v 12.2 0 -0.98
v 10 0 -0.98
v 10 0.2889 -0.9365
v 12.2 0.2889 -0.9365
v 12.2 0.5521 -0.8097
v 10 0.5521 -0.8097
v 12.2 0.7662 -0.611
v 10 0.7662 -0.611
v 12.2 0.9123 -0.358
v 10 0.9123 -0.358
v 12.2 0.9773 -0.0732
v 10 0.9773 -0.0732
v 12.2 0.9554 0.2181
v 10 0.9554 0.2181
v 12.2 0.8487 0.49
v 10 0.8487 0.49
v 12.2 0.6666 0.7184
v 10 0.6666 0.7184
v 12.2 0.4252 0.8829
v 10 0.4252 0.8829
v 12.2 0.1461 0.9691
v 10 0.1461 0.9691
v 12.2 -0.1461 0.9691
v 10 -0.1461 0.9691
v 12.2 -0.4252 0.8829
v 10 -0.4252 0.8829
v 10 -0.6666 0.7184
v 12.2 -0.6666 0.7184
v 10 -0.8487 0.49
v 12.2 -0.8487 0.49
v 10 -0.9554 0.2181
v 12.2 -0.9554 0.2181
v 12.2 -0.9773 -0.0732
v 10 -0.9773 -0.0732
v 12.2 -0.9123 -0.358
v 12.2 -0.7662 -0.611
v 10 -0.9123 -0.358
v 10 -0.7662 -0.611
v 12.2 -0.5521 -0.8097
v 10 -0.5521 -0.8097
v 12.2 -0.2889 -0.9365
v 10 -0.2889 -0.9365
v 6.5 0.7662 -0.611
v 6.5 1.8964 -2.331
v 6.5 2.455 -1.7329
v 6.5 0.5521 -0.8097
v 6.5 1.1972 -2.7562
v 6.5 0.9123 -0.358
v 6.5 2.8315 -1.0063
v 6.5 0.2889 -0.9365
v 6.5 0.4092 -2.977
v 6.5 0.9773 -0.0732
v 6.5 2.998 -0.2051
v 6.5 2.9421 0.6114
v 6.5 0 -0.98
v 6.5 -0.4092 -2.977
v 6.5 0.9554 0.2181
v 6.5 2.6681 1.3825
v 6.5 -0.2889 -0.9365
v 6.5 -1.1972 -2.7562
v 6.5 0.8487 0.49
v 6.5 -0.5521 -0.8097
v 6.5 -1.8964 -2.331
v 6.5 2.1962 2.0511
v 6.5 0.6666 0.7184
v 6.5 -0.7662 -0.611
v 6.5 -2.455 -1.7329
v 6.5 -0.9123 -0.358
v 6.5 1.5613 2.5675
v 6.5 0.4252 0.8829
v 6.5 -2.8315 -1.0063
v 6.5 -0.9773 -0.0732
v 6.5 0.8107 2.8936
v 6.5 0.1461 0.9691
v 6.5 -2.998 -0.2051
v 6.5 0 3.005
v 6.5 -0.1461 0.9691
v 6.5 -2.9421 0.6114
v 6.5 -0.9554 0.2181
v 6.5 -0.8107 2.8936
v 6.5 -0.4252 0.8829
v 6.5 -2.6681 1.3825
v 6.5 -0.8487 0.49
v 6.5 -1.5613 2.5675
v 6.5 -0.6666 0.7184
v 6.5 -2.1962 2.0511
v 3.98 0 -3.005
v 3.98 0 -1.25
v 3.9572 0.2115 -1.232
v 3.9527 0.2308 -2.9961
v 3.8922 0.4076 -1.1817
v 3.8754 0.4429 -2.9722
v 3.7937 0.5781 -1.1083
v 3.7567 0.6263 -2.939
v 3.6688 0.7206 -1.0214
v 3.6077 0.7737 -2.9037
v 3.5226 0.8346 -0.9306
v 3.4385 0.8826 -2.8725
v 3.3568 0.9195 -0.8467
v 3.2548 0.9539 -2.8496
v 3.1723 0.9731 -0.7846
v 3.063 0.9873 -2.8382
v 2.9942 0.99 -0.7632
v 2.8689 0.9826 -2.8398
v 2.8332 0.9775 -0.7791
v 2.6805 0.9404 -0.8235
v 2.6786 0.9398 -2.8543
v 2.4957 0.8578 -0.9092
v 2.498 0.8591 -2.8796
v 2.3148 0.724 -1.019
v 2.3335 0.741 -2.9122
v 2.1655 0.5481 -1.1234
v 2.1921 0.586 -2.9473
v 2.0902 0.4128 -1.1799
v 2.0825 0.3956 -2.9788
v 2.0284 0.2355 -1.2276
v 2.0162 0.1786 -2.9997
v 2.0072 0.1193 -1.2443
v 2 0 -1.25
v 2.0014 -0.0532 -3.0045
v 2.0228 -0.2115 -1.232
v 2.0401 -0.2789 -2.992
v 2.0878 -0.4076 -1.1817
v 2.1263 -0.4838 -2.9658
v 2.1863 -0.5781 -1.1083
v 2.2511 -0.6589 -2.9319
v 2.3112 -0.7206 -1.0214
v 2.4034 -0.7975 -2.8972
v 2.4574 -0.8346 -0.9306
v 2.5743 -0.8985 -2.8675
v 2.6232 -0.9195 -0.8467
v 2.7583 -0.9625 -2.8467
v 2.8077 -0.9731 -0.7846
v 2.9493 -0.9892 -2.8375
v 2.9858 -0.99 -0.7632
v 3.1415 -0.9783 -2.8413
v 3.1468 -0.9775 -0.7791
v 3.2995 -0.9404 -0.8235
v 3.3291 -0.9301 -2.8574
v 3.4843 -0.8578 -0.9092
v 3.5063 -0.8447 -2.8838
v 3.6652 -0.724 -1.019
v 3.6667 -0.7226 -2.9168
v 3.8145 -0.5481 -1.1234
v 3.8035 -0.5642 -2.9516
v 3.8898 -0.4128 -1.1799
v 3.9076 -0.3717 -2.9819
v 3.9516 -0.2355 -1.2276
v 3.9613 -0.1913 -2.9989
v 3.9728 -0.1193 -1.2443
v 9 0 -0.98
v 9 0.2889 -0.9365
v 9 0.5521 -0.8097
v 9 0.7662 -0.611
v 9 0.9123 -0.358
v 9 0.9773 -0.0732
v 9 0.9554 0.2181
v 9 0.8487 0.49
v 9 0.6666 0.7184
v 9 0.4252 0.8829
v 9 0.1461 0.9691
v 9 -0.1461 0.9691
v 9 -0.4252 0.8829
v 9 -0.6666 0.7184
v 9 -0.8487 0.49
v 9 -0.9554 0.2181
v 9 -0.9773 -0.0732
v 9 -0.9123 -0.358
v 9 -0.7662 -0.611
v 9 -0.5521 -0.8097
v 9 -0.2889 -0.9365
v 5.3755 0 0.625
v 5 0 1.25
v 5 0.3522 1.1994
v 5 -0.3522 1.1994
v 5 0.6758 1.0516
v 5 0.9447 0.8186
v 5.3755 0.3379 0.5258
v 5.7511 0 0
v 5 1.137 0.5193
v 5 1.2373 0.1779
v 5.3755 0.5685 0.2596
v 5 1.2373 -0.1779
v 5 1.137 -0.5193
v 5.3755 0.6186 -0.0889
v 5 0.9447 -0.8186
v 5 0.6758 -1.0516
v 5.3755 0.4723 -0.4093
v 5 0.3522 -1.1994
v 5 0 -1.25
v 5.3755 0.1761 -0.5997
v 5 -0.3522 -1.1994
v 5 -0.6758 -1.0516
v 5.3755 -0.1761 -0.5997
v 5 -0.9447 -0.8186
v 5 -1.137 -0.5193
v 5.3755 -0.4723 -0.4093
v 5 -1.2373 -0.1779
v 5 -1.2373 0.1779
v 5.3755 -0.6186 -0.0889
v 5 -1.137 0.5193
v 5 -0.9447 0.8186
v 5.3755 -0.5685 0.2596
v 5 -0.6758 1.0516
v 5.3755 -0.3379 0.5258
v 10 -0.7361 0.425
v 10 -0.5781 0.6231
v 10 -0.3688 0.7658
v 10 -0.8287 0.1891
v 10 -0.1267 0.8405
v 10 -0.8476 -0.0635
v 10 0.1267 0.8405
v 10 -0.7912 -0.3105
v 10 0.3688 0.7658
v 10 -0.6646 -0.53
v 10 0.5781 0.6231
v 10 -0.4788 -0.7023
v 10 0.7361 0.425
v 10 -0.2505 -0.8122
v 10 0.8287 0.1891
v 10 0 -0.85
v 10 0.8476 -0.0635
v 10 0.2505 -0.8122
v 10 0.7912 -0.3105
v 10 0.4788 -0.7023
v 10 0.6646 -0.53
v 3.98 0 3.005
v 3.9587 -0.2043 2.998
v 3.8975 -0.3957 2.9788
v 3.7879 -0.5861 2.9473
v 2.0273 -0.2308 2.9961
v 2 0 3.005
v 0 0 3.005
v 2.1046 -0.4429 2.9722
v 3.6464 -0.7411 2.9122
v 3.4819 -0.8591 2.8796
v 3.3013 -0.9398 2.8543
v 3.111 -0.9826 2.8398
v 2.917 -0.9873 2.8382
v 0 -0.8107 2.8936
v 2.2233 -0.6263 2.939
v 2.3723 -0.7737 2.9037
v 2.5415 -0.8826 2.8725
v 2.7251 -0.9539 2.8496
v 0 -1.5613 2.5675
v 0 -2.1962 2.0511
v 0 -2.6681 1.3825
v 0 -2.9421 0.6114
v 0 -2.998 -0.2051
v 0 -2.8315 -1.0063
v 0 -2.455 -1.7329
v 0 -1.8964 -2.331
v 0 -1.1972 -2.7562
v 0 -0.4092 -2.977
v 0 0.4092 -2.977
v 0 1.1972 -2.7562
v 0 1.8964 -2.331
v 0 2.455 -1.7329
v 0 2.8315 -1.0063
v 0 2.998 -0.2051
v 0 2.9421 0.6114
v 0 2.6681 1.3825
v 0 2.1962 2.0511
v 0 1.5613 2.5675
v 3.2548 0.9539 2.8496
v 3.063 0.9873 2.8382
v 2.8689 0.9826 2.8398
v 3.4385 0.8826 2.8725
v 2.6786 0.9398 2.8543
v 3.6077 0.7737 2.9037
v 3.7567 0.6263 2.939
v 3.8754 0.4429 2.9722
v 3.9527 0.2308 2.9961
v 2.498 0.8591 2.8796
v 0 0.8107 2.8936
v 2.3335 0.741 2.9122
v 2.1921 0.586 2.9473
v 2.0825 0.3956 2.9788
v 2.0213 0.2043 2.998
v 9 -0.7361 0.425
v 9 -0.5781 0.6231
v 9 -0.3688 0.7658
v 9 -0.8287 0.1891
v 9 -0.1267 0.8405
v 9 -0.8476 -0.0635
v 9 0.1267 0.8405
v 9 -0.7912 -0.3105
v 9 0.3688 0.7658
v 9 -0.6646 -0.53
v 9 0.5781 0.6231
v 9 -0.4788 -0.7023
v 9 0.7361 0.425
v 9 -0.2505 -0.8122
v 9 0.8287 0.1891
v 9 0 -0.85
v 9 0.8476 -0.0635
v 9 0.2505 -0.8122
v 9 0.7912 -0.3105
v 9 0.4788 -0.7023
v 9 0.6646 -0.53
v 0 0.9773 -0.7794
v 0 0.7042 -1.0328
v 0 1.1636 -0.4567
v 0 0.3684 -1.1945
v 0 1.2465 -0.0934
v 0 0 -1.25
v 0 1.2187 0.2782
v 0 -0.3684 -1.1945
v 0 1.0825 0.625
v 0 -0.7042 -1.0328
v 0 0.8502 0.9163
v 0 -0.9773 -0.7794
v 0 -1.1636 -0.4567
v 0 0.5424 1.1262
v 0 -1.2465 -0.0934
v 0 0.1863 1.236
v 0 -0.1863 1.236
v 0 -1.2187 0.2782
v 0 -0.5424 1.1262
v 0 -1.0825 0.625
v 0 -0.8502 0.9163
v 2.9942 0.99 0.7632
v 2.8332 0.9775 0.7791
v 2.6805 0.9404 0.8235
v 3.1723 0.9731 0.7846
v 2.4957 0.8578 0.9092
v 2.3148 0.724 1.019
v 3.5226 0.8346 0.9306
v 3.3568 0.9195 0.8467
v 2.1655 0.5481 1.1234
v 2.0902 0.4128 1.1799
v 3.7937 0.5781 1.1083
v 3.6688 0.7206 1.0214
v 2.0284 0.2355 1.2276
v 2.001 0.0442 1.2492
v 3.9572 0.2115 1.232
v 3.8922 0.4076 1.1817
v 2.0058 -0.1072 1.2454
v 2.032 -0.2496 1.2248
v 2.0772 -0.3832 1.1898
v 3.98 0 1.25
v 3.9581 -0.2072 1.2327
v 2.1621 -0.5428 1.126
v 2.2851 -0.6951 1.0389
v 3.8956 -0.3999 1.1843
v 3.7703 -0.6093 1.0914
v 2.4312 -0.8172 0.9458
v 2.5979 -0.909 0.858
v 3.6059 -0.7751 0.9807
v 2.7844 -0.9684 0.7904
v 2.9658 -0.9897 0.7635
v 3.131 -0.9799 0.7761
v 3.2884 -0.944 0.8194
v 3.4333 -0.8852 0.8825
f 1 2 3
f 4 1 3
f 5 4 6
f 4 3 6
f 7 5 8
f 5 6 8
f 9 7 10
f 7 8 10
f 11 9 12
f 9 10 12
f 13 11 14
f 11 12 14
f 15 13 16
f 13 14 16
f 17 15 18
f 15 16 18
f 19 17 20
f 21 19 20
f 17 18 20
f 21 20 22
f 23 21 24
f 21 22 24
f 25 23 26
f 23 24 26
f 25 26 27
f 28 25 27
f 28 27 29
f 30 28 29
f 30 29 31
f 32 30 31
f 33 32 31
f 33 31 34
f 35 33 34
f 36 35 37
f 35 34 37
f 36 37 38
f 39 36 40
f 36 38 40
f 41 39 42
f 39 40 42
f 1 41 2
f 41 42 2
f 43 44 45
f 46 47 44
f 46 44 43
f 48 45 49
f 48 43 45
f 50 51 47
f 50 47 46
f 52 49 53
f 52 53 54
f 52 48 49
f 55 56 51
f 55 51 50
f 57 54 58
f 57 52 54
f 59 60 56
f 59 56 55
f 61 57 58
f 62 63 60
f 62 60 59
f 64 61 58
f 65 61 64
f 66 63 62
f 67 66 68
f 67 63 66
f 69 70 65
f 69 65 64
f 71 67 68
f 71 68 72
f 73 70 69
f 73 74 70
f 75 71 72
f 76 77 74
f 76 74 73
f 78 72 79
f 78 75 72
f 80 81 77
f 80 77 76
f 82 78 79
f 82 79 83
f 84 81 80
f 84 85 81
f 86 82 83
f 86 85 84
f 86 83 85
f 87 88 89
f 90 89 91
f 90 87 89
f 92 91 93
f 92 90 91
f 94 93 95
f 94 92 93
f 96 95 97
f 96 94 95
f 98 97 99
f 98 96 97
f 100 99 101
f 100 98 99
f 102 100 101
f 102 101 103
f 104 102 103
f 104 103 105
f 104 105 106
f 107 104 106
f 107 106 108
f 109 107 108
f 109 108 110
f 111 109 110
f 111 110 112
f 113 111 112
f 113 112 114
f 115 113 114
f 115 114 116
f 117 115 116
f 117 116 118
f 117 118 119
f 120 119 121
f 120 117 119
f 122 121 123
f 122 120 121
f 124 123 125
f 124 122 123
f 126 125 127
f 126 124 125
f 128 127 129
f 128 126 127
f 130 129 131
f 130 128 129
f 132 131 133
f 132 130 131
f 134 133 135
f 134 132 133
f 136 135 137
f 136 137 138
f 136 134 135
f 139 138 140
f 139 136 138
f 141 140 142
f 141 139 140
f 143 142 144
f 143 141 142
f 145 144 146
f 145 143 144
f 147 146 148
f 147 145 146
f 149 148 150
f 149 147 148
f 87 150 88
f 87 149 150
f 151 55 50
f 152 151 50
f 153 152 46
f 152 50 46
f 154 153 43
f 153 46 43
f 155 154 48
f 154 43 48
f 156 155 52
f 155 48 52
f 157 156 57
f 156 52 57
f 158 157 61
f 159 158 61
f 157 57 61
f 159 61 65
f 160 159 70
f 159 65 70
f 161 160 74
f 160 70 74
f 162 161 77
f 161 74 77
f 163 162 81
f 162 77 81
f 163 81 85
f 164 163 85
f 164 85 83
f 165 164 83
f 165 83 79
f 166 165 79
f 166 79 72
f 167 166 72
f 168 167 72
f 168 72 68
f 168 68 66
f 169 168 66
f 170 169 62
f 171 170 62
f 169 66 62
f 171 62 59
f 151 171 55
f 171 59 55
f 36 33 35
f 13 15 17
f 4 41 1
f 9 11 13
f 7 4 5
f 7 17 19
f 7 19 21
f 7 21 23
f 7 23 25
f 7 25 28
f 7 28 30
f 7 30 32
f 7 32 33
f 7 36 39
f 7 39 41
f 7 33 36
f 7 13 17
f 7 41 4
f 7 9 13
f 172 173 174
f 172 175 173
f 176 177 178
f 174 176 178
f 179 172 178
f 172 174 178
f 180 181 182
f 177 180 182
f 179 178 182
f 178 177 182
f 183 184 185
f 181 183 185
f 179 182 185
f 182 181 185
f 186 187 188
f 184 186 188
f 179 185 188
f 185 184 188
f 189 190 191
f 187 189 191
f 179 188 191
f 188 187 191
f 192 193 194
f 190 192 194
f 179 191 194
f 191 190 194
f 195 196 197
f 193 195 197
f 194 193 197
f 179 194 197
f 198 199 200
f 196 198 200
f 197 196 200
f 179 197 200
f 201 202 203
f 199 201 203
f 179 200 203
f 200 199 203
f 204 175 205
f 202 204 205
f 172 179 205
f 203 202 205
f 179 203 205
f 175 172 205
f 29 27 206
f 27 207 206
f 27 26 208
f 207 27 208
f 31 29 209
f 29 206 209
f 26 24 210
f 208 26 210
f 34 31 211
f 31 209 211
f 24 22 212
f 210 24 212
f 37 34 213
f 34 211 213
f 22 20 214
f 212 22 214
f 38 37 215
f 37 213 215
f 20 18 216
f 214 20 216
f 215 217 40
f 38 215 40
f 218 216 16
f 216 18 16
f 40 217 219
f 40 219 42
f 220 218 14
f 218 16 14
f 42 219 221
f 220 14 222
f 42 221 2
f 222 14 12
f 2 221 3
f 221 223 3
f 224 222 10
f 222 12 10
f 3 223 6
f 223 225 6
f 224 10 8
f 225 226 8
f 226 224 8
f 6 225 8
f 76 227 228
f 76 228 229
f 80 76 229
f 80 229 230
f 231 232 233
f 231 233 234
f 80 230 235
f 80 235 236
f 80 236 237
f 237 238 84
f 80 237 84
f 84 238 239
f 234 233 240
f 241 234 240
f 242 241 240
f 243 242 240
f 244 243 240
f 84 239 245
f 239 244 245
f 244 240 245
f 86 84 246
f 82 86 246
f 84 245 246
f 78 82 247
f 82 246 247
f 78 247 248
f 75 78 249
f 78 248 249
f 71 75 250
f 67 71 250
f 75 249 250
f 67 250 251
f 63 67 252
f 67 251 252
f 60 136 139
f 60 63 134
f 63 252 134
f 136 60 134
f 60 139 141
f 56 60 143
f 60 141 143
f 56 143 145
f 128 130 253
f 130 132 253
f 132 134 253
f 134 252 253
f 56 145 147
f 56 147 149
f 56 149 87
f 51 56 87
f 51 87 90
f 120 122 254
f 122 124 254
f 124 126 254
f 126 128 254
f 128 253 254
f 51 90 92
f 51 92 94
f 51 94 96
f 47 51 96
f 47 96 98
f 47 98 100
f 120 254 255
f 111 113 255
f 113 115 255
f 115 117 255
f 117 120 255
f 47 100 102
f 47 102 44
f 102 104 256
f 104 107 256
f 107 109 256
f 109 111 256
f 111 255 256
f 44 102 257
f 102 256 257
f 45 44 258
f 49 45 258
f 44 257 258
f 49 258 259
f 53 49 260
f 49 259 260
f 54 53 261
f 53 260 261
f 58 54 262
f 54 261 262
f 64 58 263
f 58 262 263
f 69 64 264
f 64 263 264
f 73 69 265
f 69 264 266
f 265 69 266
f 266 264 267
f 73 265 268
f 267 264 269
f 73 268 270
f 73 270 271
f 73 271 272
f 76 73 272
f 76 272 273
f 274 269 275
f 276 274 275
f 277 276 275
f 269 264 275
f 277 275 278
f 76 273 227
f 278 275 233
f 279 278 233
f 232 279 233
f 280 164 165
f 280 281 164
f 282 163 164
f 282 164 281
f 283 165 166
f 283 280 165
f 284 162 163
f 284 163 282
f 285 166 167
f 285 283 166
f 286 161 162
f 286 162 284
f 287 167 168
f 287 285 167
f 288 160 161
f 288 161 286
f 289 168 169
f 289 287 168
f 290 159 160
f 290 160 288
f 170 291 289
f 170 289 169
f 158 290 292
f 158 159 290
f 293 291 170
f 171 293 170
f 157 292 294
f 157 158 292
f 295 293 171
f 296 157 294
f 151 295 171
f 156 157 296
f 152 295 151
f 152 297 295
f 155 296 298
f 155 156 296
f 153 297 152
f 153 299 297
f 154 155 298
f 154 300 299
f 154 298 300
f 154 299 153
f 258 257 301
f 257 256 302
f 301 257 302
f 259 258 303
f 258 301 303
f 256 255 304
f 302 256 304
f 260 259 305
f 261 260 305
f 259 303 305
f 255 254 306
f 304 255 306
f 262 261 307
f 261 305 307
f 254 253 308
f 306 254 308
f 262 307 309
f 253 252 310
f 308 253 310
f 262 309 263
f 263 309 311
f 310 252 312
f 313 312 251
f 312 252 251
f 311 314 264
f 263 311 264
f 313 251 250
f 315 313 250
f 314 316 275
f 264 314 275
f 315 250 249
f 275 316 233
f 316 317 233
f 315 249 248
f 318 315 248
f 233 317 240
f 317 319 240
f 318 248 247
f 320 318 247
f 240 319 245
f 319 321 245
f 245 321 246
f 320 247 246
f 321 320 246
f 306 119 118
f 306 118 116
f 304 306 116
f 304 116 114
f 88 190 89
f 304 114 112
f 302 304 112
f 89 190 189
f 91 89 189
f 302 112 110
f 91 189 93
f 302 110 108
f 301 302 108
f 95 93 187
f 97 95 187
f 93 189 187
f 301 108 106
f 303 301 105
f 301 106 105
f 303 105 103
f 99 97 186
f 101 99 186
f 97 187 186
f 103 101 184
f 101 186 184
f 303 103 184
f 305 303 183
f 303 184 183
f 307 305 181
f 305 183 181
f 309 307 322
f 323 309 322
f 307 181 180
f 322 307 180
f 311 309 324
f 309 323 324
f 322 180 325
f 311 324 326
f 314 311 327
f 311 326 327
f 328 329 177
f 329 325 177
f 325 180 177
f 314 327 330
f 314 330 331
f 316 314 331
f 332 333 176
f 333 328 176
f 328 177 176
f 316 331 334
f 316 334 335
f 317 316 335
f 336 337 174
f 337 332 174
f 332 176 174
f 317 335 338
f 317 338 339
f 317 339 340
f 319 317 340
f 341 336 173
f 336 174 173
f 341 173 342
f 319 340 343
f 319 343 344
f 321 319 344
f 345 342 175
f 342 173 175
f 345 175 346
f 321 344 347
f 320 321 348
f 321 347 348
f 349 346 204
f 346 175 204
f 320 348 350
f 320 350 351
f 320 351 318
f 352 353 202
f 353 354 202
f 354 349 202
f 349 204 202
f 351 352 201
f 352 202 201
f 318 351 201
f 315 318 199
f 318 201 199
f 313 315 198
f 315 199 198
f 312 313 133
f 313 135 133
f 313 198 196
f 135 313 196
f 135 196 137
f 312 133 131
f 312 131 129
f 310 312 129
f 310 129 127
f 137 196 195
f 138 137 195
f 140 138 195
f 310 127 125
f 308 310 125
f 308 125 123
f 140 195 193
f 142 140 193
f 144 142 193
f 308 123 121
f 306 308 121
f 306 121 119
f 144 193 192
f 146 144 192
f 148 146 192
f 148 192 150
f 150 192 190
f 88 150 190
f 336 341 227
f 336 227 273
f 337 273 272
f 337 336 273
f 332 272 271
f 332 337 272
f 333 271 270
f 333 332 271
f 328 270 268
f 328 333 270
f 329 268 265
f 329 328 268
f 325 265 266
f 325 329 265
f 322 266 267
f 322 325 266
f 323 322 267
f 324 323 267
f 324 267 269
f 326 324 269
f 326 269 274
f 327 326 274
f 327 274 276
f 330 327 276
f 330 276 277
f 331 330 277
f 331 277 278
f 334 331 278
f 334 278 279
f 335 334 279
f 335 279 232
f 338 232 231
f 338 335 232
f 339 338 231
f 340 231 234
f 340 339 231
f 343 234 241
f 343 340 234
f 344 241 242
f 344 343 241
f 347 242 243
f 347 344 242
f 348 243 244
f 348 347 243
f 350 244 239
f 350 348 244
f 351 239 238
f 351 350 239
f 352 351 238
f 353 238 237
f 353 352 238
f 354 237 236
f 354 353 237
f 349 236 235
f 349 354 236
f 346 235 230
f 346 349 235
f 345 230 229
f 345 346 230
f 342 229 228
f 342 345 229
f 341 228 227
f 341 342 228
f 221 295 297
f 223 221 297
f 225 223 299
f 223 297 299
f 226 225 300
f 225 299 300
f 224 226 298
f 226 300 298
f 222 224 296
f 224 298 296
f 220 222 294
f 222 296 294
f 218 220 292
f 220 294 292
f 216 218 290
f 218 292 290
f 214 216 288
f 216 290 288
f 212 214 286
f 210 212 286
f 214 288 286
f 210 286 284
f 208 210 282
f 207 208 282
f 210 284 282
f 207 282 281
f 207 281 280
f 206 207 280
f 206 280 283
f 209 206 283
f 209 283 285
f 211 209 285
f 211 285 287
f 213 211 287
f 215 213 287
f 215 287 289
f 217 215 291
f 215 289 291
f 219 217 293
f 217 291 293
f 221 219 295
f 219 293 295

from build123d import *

# Parameters (mm, degrees)
SCHIZZO1_R                    = 3.005
ESTRUSIONE_ESTRUSIONE1_DEPTH  = 6.5
SCHIZZO2_R                    = 0.98
ESTRUSIONE_ESTRUSIONE2_DEPTH  = 2.5
SCHIZZO3_R                    = 0.85
ESTRUSIONE_ESTRUSIONE3_DEPTH  = 1
SCHIZZO4_R                    = 0.98
ESTRUSIONE_ESTRUSIONE4_DEPTH  = 2.2
FORO_FILETTATO_M3X0_5_1_D     = 2.5
FORO_FILETTATO_M3X0_5_1_DEPTH = 5
FORO_FILETTATO_M3X0_5_1_TIP   = 0.751075774
TAGLIO_ESTRUSIONE1_DEPTH      = 13.918980223
TAGLIO_ESTRUSIONE1_DEPTH_BACK = 13.918980223
SCHIZZO7_R                    = 0.99


with BuildPart() as part:
    # Schizzo1 → Estrusione-Estrusione1 (new body)
    with BuildSketch(Plane(origin=(0, 0, 0), x_dir=(0, 0, -1), z_dir=(1, 0, 0))):
        with Locations(Location((0, 0, 0), (0, 0, 180))):
            Circle(SCHIZZO1_R)
    extrude(amount=ESTRUSIONE_ESTRUSIONE1_DEPTH)

    # Schizzo2 → Estrusione-Estrusione2 (add)
    with BuildSketch(Plane(origin=(6.5, 0, 0), x_dir=(0, 0, -1), z_dir=(1, 0, 0))):
        Circle(SCHIZZO2_R)
    extrude(amount=ESTRUSIONE_ESTRUSIONE2_DEPTH)

    # Schizzo3 → Estrusione-Estrusione3 (add)
    with BuildSketch(Plane(origin=(9, 0, 0), x_dir=(0, 0, -1), z_dir=(1, 0, 0))):
        Circle(SCHIZZO3_R)
    extrude(amount=ESTRUSIONE_ESTRUSIONE3_DEPTH)

    # Schizzo4 → Estrusione-Estrusione4 (add)
    with BuildSketch(Plane(origin=(10, 0, 0), x_dir=(0, 0, -1), z_dir=(1, 0, 0))):
        Circle(SCHIZZO4_R)
    extrude(amount=ESTRUSIONE_ESTRUSIONE4_DEPTH)

    # Foro filettato M3x0.5-1
    with Locations(Plane.ZY):
        with Locations((0, 0)):
            Hole(FORO_FILETTATO_M3X0_5_1_D / 2, depth=FORO_FILETTATO_M3X0_5_1_DEPTH)
            with Locations((0, 0, -(FORO_FILETTATO_M3X0_5_1_DEPTH + FORO_FILETTATO_M3X0_5_1_TIP / 2))):  # 118° drill point
                Cone(0, FORO_FILETTATO_M3X0_5_1_D / 2, FORO_FILETTATO_M3X0_5_1_TIP, mode=Mode.SUBTRACT)

    # Schizzo7 → Taglio-Estrusione1 (cut, two sides: drawn at the far end of the back side and taken through both)
    with BuildSketch(Plane.XY.offset(-TAGLIO_ESTRUSIONE1_DEPTH_BACK)):
        with Locations((2.99, 0)):
            Circle(SCHIZZO7_R)
    extrude(amount=TAGLIO_ESTRUSIONE1_DEPTH + TAGLIO_ESTRUSIONE1_DEPTH_BACK, mode=Mode.SUBTRACT)


solid = part.part
